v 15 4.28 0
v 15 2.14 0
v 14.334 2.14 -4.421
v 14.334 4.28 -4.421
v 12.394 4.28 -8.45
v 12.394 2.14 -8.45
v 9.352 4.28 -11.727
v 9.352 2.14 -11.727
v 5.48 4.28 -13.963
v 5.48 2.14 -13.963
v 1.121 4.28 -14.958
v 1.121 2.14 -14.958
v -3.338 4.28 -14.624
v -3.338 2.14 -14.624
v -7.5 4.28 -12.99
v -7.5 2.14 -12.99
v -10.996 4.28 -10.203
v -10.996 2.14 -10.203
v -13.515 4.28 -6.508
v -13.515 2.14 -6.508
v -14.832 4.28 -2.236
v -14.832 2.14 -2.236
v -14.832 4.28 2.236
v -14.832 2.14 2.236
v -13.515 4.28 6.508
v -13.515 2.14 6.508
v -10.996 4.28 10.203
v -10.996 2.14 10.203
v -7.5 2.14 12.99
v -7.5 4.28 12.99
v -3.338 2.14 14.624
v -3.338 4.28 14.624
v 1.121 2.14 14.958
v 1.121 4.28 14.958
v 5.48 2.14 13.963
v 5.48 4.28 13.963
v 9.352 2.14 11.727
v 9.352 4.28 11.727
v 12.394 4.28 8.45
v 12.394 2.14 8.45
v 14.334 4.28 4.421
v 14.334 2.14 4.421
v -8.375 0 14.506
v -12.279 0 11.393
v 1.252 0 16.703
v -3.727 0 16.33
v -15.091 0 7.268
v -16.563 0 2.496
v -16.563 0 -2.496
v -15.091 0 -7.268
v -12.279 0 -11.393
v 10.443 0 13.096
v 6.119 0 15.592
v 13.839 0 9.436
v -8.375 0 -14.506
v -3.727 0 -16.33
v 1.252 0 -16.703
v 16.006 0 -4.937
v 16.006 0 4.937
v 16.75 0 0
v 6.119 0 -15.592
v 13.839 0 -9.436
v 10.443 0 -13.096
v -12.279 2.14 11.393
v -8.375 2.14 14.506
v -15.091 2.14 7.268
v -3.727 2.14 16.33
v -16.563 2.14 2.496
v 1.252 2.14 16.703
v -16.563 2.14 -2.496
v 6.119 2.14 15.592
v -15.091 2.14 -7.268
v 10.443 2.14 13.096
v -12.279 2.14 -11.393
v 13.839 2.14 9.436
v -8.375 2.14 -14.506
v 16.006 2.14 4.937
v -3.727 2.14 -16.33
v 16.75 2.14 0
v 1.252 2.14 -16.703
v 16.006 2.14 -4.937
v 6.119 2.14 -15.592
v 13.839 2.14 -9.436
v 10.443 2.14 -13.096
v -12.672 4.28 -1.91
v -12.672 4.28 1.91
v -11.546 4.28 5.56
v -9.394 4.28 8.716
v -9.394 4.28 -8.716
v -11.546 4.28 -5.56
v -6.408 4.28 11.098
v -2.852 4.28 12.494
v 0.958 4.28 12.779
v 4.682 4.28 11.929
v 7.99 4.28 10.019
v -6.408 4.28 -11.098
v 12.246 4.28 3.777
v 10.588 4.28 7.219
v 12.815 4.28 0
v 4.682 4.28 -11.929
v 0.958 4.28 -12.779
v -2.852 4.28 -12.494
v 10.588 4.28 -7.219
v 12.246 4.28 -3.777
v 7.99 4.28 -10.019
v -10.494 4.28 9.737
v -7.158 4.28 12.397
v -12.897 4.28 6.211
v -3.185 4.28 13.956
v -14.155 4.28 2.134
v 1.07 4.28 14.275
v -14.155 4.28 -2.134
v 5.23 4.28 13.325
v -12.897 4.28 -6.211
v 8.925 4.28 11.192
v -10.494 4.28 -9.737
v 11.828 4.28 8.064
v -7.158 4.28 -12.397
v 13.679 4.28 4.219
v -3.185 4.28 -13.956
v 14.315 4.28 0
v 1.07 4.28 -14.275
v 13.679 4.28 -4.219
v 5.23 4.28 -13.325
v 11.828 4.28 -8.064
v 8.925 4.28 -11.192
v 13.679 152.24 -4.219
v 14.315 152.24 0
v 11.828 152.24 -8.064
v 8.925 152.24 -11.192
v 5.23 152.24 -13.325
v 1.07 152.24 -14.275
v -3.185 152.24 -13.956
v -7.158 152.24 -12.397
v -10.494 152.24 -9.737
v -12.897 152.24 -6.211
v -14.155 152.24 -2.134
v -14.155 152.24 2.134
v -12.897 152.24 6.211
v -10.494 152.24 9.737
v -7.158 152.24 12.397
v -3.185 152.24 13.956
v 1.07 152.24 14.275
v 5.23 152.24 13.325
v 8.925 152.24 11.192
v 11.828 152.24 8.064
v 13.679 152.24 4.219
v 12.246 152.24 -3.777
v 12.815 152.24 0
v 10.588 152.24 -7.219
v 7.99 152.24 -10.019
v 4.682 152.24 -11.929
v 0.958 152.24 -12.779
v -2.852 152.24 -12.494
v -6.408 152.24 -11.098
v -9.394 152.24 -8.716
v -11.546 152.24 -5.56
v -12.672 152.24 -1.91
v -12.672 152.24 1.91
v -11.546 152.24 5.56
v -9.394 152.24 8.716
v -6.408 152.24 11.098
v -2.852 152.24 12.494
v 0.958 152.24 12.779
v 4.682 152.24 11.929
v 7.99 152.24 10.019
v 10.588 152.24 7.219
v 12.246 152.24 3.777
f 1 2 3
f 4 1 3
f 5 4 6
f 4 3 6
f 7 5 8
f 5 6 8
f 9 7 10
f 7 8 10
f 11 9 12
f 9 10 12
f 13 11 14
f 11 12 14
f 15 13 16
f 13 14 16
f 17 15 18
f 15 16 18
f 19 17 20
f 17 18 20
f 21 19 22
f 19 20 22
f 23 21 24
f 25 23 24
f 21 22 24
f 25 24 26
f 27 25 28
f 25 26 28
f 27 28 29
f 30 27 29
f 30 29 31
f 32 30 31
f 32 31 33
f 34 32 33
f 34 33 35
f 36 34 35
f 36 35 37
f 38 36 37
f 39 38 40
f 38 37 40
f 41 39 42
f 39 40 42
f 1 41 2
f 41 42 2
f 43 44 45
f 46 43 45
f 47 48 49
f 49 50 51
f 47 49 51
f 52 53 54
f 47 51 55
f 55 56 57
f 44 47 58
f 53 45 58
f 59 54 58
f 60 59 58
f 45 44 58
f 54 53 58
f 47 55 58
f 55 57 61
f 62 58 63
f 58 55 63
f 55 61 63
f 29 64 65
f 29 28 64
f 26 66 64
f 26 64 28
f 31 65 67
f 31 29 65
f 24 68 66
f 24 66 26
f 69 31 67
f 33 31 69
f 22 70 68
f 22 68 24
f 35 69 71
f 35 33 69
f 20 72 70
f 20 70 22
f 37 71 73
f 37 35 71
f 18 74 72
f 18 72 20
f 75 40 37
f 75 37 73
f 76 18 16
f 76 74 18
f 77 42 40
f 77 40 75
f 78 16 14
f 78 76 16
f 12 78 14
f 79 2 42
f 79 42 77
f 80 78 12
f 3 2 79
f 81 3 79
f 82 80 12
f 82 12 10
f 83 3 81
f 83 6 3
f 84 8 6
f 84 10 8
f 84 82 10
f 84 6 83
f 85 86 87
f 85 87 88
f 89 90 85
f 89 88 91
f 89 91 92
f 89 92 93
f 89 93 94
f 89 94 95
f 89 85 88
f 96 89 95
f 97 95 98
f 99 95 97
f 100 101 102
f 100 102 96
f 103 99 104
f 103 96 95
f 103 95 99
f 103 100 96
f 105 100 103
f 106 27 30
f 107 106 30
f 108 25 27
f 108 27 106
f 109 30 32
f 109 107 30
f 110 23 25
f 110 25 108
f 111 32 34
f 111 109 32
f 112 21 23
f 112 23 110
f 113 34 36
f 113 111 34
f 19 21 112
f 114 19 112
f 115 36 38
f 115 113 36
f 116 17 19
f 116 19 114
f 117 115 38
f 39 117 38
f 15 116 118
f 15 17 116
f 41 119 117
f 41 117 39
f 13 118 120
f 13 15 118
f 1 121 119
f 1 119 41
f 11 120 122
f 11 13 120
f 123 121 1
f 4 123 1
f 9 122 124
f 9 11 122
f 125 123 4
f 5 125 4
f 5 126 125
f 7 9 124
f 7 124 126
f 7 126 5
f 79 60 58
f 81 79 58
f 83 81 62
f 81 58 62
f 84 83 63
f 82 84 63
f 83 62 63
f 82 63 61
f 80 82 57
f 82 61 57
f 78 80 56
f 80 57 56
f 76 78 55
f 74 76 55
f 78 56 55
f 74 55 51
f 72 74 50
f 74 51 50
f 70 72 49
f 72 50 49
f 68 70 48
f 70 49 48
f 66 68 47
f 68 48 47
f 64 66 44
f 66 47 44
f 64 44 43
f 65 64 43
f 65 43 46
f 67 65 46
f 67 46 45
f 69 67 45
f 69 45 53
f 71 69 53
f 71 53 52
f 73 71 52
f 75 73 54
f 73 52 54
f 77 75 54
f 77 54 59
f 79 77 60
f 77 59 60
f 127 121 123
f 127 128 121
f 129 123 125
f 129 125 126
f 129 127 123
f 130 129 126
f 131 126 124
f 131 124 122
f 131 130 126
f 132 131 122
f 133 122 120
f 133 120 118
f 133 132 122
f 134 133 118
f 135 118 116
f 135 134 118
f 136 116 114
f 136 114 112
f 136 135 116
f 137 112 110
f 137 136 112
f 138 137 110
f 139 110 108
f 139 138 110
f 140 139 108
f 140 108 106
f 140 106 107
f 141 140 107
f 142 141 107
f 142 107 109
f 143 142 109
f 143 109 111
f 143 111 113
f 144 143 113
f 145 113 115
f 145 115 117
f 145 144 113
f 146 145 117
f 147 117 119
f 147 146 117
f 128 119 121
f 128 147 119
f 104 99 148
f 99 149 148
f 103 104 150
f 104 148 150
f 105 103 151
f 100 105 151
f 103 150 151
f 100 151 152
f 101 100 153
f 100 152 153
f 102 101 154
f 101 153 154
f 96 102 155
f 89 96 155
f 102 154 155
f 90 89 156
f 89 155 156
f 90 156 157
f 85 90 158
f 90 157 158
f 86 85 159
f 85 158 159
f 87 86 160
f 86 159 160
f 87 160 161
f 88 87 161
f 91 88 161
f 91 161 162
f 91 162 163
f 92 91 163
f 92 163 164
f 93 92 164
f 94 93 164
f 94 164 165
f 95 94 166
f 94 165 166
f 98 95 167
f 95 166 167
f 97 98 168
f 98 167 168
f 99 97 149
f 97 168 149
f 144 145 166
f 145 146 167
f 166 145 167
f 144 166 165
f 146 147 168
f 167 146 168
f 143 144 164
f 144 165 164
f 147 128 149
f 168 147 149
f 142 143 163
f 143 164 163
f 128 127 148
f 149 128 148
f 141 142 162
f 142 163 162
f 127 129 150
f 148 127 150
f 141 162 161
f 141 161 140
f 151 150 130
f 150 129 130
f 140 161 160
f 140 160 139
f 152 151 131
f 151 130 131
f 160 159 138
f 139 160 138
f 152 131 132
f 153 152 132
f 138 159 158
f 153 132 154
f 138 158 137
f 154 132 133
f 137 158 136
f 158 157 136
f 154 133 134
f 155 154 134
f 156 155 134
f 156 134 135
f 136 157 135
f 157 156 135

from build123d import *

# Parameters (mm, degrees)
SKETCH1_W           = 1.5
SKETCH1_H           = 152.24
SKETCH2_R           = 16.75
BOSS_EXTRUDE1_DEPTH = 2.14
SKETCH4_R           = 15
BOSS_EXTRUDE2_DEPTH = 2.14


with BuildPart() as part:
    # Sketch1 → Revolve1 (revolve)
    with BuildSketch(Plane.XY):
        with Locations((13.565, 76.12)):
            Rectangle(SKETCH1_W, SKETCH1_H)
    revolve(axis=Axis((0, 0, 0), (0, 1, 0)))

    # Sketch2 → Boss-Extrude1 (add)
    with BuildSketch(Plane(origin=(0, 0, 0), x_dir=(1, 0, 0), z_dir=(0, 1, 0))):
        Circle(SKETCH2_R)
    extrude(amount=BOSS_EXTRUDE1_DEPTH)

    # Sketch4 → Boss-Extrude2 (add)
    with BuildSketch(Plane(origin=(0, 2.14, 0), x_dir=(1, 0, 0), z_dir=(0, 1, 0))):
        Circle(SKETCH4_R)
    extrude(amount=BOSS_EXTRUDE2_DEPTH)


solid = part.part
